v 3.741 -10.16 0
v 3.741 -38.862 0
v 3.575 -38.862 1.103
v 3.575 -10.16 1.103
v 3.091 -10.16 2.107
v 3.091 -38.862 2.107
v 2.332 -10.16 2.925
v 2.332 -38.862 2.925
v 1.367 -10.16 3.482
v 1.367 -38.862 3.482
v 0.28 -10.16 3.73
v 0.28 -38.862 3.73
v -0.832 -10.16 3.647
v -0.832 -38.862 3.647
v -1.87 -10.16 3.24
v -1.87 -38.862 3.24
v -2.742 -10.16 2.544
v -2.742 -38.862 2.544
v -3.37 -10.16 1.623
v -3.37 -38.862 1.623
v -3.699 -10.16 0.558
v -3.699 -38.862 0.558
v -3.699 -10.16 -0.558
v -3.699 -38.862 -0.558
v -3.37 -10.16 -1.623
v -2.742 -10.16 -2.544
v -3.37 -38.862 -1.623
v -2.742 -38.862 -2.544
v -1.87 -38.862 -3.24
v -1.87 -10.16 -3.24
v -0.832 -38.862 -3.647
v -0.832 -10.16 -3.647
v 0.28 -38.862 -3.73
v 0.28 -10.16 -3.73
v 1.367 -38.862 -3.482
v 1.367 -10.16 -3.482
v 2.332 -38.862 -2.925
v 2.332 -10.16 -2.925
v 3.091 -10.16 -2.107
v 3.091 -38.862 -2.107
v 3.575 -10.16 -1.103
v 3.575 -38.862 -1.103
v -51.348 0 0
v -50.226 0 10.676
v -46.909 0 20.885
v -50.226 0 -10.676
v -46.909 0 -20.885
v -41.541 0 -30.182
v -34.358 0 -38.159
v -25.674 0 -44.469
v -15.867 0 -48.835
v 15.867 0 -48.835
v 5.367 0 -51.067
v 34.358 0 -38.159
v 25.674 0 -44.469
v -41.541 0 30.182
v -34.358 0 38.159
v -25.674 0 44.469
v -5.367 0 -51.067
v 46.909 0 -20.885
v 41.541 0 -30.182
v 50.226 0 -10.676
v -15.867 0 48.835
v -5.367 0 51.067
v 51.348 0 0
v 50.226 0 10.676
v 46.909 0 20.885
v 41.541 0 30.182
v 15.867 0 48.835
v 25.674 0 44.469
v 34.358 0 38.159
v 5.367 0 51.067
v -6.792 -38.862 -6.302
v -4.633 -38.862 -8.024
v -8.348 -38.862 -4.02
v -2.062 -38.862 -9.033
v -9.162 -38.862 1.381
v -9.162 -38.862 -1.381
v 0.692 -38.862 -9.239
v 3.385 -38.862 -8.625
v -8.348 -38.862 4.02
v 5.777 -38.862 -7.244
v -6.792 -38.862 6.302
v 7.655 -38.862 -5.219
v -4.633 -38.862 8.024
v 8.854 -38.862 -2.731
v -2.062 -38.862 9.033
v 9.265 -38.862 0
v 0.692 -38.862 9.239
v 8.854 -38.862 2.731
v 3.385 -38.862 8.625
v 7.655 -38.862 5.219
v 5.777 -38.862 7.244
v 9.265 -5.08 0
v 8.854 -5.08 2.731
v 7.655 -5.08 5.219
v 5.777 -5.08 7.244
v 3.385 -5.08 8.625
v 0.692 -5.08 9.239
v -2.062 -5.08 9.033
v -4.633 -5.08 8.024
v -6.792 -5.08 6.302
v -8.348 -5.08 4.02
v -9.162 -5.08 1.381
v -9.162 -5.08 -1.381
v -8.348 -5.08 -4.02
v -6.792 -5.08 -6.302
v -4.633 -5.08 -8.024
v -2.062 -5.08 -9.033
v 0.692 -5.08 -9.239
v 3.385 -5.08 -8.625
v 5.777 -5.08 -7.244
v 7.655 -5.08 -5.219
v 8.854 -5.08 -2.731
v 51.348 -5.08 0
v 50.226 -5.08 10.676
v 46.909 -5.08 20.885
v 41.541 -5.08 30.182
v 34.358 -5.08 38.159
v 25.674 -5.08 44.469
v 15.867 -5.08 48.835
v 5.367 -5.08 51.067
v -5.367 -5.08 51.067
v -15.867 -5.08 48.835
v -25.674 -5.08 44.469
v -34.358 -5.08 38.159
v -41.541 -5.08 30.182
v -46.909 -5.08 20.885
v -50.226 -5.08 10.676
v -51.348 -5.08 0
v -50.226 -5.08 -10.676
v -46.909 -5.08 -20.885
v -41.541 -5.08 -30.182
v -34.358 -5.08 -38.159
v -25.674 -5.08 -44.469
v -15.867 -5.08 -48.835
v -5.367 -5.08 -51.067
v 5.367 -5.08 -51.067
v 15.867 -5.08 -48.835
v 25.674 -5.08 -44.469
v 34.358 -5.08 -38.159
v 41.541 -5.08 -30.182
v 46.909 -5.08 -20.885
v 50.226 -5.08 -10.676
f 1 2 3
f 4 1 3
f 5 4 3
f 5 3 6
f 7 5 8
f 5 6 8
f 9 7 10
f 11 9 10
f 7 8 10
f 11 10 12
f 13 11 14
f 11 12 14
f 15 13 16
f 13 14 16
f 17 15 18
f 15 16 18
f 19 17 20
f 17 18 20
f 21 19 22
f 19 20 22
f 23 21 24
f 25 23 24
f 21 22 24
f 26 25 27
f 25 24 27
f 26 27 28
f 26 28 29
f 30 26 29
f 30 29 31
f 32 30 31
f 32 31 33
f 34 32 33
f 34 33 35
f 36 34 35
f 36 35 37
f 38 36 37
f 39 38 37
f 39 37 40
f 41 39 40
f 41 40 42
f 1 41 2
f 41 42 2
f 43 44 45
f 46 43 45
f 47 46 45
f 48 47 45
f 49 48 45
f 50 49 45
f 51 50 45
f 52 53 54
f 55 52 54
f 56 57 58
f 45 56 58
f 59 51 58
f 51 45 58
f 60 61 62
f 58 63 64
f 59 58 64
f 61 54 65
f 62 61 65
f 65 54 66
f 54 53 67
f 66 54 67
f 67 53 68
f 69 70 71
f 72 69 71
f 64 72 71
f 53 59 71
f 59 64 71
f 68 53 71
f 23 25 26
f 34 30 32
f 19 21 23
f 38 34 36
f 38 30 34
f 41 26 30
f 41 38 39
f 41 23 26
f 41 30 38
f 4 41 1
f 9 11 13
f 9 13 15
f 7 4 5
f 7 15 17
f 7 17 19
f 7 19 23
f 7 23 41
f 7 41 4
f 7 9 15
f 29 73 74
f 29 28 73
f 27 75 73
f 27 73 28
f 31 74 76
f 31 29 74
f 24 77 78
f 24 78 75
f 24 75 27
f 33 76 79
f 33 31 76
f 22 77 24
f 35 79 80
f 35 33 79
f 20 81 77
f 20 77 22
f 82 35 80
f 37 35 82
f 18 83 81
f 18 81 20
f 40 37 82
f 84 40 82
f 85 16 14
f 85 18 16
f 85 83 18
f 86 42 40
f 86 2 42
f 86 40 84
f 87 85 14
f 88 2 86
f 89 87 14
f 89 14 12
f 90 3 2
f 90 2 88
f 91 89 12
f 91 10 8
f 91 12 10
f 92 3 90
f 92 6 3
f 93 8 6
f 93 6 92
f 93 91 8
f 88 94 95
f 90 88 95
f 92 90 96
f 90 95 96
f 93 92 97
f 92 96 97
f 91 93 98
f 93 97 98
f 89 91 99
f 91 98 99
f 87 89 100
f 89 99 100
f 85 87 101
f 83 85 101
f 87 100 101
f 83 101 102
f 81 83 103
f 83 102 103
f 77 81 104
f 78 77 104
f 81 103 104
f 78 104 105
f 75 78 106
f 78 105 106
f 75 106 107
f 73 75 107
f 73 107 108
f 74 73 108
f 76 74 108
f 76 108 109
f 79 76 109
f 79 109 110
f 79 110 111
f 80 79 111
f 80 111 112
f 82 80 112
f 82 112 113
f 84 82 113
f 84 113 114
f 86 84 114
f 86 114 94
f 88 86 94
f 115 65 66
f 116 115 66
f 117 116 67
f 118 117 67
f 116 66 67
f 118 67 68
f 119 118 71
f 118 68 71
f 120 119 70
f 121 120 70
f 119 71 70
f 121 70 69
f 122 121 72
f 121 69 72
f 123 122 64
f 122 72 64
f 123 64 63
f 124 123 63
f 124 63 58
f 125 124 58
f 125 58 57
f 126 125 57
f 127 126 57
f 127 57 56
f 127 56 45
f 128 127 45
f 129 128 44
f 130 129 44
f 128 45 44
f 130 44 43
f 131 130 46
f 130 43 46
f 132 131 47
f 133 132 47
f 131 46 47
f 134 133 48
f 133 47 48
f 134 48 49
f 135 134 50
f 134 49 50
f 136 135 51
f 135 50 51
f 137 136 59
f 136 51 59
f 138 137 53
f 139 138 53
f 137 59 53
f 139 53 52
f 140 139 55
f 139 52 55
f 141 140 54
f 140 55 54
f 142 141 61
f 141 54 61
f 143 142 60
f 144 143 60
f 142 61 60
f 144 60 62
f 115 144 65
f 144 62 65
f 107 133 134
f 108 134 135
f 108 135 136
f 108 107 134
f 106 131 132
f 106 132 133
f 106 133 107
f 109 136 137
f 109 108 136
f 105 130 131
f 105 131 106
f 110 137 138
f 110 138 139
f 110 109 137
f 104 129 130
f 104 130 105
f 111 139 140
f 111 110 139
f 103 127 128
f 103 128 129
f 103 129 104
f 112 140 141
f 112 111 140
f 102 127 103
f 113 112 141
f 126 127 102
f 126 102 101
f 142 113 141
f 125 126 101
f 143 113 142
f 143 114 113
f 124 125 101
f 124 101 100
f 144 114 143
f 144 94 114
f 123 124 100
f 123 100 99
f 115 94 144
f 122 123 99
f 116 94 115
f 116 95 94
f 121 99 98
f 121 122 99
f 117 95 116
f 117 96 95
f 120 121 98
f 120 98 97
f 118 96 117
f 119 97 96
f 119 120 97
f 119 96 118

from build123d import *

# Parameters (mm, degrees)
F0_R     = 51.347904
F1_DEPTH = 5.08
F2_R     = 9.265386
F3_DEPTH = 38.862
F4_R     = 3.740808
F5_DEPTH = 28.702


with BuildPart() as f1:
    # F0 (on Front) → F1 (new body)
    with BuildSketch(Plane.XZ):
        Circle(F0_R)
    extrude(amount=F1_DEPTH)

    # F2 (on Front) → F3 (join)
    with BuildSketch(Plane.XZ):
        Circle(F2_R)
    extrude(amount=F3_DEPTH)

    # F4 (on face) → F5 (cut)
    with BuildSketch(Plane.XZ.offset(38.862)):
        Circle(F4_R)
    extrude(amount=-F5_DEPTH, mode=Mode.SUBTRACT)


solid = f1.part
